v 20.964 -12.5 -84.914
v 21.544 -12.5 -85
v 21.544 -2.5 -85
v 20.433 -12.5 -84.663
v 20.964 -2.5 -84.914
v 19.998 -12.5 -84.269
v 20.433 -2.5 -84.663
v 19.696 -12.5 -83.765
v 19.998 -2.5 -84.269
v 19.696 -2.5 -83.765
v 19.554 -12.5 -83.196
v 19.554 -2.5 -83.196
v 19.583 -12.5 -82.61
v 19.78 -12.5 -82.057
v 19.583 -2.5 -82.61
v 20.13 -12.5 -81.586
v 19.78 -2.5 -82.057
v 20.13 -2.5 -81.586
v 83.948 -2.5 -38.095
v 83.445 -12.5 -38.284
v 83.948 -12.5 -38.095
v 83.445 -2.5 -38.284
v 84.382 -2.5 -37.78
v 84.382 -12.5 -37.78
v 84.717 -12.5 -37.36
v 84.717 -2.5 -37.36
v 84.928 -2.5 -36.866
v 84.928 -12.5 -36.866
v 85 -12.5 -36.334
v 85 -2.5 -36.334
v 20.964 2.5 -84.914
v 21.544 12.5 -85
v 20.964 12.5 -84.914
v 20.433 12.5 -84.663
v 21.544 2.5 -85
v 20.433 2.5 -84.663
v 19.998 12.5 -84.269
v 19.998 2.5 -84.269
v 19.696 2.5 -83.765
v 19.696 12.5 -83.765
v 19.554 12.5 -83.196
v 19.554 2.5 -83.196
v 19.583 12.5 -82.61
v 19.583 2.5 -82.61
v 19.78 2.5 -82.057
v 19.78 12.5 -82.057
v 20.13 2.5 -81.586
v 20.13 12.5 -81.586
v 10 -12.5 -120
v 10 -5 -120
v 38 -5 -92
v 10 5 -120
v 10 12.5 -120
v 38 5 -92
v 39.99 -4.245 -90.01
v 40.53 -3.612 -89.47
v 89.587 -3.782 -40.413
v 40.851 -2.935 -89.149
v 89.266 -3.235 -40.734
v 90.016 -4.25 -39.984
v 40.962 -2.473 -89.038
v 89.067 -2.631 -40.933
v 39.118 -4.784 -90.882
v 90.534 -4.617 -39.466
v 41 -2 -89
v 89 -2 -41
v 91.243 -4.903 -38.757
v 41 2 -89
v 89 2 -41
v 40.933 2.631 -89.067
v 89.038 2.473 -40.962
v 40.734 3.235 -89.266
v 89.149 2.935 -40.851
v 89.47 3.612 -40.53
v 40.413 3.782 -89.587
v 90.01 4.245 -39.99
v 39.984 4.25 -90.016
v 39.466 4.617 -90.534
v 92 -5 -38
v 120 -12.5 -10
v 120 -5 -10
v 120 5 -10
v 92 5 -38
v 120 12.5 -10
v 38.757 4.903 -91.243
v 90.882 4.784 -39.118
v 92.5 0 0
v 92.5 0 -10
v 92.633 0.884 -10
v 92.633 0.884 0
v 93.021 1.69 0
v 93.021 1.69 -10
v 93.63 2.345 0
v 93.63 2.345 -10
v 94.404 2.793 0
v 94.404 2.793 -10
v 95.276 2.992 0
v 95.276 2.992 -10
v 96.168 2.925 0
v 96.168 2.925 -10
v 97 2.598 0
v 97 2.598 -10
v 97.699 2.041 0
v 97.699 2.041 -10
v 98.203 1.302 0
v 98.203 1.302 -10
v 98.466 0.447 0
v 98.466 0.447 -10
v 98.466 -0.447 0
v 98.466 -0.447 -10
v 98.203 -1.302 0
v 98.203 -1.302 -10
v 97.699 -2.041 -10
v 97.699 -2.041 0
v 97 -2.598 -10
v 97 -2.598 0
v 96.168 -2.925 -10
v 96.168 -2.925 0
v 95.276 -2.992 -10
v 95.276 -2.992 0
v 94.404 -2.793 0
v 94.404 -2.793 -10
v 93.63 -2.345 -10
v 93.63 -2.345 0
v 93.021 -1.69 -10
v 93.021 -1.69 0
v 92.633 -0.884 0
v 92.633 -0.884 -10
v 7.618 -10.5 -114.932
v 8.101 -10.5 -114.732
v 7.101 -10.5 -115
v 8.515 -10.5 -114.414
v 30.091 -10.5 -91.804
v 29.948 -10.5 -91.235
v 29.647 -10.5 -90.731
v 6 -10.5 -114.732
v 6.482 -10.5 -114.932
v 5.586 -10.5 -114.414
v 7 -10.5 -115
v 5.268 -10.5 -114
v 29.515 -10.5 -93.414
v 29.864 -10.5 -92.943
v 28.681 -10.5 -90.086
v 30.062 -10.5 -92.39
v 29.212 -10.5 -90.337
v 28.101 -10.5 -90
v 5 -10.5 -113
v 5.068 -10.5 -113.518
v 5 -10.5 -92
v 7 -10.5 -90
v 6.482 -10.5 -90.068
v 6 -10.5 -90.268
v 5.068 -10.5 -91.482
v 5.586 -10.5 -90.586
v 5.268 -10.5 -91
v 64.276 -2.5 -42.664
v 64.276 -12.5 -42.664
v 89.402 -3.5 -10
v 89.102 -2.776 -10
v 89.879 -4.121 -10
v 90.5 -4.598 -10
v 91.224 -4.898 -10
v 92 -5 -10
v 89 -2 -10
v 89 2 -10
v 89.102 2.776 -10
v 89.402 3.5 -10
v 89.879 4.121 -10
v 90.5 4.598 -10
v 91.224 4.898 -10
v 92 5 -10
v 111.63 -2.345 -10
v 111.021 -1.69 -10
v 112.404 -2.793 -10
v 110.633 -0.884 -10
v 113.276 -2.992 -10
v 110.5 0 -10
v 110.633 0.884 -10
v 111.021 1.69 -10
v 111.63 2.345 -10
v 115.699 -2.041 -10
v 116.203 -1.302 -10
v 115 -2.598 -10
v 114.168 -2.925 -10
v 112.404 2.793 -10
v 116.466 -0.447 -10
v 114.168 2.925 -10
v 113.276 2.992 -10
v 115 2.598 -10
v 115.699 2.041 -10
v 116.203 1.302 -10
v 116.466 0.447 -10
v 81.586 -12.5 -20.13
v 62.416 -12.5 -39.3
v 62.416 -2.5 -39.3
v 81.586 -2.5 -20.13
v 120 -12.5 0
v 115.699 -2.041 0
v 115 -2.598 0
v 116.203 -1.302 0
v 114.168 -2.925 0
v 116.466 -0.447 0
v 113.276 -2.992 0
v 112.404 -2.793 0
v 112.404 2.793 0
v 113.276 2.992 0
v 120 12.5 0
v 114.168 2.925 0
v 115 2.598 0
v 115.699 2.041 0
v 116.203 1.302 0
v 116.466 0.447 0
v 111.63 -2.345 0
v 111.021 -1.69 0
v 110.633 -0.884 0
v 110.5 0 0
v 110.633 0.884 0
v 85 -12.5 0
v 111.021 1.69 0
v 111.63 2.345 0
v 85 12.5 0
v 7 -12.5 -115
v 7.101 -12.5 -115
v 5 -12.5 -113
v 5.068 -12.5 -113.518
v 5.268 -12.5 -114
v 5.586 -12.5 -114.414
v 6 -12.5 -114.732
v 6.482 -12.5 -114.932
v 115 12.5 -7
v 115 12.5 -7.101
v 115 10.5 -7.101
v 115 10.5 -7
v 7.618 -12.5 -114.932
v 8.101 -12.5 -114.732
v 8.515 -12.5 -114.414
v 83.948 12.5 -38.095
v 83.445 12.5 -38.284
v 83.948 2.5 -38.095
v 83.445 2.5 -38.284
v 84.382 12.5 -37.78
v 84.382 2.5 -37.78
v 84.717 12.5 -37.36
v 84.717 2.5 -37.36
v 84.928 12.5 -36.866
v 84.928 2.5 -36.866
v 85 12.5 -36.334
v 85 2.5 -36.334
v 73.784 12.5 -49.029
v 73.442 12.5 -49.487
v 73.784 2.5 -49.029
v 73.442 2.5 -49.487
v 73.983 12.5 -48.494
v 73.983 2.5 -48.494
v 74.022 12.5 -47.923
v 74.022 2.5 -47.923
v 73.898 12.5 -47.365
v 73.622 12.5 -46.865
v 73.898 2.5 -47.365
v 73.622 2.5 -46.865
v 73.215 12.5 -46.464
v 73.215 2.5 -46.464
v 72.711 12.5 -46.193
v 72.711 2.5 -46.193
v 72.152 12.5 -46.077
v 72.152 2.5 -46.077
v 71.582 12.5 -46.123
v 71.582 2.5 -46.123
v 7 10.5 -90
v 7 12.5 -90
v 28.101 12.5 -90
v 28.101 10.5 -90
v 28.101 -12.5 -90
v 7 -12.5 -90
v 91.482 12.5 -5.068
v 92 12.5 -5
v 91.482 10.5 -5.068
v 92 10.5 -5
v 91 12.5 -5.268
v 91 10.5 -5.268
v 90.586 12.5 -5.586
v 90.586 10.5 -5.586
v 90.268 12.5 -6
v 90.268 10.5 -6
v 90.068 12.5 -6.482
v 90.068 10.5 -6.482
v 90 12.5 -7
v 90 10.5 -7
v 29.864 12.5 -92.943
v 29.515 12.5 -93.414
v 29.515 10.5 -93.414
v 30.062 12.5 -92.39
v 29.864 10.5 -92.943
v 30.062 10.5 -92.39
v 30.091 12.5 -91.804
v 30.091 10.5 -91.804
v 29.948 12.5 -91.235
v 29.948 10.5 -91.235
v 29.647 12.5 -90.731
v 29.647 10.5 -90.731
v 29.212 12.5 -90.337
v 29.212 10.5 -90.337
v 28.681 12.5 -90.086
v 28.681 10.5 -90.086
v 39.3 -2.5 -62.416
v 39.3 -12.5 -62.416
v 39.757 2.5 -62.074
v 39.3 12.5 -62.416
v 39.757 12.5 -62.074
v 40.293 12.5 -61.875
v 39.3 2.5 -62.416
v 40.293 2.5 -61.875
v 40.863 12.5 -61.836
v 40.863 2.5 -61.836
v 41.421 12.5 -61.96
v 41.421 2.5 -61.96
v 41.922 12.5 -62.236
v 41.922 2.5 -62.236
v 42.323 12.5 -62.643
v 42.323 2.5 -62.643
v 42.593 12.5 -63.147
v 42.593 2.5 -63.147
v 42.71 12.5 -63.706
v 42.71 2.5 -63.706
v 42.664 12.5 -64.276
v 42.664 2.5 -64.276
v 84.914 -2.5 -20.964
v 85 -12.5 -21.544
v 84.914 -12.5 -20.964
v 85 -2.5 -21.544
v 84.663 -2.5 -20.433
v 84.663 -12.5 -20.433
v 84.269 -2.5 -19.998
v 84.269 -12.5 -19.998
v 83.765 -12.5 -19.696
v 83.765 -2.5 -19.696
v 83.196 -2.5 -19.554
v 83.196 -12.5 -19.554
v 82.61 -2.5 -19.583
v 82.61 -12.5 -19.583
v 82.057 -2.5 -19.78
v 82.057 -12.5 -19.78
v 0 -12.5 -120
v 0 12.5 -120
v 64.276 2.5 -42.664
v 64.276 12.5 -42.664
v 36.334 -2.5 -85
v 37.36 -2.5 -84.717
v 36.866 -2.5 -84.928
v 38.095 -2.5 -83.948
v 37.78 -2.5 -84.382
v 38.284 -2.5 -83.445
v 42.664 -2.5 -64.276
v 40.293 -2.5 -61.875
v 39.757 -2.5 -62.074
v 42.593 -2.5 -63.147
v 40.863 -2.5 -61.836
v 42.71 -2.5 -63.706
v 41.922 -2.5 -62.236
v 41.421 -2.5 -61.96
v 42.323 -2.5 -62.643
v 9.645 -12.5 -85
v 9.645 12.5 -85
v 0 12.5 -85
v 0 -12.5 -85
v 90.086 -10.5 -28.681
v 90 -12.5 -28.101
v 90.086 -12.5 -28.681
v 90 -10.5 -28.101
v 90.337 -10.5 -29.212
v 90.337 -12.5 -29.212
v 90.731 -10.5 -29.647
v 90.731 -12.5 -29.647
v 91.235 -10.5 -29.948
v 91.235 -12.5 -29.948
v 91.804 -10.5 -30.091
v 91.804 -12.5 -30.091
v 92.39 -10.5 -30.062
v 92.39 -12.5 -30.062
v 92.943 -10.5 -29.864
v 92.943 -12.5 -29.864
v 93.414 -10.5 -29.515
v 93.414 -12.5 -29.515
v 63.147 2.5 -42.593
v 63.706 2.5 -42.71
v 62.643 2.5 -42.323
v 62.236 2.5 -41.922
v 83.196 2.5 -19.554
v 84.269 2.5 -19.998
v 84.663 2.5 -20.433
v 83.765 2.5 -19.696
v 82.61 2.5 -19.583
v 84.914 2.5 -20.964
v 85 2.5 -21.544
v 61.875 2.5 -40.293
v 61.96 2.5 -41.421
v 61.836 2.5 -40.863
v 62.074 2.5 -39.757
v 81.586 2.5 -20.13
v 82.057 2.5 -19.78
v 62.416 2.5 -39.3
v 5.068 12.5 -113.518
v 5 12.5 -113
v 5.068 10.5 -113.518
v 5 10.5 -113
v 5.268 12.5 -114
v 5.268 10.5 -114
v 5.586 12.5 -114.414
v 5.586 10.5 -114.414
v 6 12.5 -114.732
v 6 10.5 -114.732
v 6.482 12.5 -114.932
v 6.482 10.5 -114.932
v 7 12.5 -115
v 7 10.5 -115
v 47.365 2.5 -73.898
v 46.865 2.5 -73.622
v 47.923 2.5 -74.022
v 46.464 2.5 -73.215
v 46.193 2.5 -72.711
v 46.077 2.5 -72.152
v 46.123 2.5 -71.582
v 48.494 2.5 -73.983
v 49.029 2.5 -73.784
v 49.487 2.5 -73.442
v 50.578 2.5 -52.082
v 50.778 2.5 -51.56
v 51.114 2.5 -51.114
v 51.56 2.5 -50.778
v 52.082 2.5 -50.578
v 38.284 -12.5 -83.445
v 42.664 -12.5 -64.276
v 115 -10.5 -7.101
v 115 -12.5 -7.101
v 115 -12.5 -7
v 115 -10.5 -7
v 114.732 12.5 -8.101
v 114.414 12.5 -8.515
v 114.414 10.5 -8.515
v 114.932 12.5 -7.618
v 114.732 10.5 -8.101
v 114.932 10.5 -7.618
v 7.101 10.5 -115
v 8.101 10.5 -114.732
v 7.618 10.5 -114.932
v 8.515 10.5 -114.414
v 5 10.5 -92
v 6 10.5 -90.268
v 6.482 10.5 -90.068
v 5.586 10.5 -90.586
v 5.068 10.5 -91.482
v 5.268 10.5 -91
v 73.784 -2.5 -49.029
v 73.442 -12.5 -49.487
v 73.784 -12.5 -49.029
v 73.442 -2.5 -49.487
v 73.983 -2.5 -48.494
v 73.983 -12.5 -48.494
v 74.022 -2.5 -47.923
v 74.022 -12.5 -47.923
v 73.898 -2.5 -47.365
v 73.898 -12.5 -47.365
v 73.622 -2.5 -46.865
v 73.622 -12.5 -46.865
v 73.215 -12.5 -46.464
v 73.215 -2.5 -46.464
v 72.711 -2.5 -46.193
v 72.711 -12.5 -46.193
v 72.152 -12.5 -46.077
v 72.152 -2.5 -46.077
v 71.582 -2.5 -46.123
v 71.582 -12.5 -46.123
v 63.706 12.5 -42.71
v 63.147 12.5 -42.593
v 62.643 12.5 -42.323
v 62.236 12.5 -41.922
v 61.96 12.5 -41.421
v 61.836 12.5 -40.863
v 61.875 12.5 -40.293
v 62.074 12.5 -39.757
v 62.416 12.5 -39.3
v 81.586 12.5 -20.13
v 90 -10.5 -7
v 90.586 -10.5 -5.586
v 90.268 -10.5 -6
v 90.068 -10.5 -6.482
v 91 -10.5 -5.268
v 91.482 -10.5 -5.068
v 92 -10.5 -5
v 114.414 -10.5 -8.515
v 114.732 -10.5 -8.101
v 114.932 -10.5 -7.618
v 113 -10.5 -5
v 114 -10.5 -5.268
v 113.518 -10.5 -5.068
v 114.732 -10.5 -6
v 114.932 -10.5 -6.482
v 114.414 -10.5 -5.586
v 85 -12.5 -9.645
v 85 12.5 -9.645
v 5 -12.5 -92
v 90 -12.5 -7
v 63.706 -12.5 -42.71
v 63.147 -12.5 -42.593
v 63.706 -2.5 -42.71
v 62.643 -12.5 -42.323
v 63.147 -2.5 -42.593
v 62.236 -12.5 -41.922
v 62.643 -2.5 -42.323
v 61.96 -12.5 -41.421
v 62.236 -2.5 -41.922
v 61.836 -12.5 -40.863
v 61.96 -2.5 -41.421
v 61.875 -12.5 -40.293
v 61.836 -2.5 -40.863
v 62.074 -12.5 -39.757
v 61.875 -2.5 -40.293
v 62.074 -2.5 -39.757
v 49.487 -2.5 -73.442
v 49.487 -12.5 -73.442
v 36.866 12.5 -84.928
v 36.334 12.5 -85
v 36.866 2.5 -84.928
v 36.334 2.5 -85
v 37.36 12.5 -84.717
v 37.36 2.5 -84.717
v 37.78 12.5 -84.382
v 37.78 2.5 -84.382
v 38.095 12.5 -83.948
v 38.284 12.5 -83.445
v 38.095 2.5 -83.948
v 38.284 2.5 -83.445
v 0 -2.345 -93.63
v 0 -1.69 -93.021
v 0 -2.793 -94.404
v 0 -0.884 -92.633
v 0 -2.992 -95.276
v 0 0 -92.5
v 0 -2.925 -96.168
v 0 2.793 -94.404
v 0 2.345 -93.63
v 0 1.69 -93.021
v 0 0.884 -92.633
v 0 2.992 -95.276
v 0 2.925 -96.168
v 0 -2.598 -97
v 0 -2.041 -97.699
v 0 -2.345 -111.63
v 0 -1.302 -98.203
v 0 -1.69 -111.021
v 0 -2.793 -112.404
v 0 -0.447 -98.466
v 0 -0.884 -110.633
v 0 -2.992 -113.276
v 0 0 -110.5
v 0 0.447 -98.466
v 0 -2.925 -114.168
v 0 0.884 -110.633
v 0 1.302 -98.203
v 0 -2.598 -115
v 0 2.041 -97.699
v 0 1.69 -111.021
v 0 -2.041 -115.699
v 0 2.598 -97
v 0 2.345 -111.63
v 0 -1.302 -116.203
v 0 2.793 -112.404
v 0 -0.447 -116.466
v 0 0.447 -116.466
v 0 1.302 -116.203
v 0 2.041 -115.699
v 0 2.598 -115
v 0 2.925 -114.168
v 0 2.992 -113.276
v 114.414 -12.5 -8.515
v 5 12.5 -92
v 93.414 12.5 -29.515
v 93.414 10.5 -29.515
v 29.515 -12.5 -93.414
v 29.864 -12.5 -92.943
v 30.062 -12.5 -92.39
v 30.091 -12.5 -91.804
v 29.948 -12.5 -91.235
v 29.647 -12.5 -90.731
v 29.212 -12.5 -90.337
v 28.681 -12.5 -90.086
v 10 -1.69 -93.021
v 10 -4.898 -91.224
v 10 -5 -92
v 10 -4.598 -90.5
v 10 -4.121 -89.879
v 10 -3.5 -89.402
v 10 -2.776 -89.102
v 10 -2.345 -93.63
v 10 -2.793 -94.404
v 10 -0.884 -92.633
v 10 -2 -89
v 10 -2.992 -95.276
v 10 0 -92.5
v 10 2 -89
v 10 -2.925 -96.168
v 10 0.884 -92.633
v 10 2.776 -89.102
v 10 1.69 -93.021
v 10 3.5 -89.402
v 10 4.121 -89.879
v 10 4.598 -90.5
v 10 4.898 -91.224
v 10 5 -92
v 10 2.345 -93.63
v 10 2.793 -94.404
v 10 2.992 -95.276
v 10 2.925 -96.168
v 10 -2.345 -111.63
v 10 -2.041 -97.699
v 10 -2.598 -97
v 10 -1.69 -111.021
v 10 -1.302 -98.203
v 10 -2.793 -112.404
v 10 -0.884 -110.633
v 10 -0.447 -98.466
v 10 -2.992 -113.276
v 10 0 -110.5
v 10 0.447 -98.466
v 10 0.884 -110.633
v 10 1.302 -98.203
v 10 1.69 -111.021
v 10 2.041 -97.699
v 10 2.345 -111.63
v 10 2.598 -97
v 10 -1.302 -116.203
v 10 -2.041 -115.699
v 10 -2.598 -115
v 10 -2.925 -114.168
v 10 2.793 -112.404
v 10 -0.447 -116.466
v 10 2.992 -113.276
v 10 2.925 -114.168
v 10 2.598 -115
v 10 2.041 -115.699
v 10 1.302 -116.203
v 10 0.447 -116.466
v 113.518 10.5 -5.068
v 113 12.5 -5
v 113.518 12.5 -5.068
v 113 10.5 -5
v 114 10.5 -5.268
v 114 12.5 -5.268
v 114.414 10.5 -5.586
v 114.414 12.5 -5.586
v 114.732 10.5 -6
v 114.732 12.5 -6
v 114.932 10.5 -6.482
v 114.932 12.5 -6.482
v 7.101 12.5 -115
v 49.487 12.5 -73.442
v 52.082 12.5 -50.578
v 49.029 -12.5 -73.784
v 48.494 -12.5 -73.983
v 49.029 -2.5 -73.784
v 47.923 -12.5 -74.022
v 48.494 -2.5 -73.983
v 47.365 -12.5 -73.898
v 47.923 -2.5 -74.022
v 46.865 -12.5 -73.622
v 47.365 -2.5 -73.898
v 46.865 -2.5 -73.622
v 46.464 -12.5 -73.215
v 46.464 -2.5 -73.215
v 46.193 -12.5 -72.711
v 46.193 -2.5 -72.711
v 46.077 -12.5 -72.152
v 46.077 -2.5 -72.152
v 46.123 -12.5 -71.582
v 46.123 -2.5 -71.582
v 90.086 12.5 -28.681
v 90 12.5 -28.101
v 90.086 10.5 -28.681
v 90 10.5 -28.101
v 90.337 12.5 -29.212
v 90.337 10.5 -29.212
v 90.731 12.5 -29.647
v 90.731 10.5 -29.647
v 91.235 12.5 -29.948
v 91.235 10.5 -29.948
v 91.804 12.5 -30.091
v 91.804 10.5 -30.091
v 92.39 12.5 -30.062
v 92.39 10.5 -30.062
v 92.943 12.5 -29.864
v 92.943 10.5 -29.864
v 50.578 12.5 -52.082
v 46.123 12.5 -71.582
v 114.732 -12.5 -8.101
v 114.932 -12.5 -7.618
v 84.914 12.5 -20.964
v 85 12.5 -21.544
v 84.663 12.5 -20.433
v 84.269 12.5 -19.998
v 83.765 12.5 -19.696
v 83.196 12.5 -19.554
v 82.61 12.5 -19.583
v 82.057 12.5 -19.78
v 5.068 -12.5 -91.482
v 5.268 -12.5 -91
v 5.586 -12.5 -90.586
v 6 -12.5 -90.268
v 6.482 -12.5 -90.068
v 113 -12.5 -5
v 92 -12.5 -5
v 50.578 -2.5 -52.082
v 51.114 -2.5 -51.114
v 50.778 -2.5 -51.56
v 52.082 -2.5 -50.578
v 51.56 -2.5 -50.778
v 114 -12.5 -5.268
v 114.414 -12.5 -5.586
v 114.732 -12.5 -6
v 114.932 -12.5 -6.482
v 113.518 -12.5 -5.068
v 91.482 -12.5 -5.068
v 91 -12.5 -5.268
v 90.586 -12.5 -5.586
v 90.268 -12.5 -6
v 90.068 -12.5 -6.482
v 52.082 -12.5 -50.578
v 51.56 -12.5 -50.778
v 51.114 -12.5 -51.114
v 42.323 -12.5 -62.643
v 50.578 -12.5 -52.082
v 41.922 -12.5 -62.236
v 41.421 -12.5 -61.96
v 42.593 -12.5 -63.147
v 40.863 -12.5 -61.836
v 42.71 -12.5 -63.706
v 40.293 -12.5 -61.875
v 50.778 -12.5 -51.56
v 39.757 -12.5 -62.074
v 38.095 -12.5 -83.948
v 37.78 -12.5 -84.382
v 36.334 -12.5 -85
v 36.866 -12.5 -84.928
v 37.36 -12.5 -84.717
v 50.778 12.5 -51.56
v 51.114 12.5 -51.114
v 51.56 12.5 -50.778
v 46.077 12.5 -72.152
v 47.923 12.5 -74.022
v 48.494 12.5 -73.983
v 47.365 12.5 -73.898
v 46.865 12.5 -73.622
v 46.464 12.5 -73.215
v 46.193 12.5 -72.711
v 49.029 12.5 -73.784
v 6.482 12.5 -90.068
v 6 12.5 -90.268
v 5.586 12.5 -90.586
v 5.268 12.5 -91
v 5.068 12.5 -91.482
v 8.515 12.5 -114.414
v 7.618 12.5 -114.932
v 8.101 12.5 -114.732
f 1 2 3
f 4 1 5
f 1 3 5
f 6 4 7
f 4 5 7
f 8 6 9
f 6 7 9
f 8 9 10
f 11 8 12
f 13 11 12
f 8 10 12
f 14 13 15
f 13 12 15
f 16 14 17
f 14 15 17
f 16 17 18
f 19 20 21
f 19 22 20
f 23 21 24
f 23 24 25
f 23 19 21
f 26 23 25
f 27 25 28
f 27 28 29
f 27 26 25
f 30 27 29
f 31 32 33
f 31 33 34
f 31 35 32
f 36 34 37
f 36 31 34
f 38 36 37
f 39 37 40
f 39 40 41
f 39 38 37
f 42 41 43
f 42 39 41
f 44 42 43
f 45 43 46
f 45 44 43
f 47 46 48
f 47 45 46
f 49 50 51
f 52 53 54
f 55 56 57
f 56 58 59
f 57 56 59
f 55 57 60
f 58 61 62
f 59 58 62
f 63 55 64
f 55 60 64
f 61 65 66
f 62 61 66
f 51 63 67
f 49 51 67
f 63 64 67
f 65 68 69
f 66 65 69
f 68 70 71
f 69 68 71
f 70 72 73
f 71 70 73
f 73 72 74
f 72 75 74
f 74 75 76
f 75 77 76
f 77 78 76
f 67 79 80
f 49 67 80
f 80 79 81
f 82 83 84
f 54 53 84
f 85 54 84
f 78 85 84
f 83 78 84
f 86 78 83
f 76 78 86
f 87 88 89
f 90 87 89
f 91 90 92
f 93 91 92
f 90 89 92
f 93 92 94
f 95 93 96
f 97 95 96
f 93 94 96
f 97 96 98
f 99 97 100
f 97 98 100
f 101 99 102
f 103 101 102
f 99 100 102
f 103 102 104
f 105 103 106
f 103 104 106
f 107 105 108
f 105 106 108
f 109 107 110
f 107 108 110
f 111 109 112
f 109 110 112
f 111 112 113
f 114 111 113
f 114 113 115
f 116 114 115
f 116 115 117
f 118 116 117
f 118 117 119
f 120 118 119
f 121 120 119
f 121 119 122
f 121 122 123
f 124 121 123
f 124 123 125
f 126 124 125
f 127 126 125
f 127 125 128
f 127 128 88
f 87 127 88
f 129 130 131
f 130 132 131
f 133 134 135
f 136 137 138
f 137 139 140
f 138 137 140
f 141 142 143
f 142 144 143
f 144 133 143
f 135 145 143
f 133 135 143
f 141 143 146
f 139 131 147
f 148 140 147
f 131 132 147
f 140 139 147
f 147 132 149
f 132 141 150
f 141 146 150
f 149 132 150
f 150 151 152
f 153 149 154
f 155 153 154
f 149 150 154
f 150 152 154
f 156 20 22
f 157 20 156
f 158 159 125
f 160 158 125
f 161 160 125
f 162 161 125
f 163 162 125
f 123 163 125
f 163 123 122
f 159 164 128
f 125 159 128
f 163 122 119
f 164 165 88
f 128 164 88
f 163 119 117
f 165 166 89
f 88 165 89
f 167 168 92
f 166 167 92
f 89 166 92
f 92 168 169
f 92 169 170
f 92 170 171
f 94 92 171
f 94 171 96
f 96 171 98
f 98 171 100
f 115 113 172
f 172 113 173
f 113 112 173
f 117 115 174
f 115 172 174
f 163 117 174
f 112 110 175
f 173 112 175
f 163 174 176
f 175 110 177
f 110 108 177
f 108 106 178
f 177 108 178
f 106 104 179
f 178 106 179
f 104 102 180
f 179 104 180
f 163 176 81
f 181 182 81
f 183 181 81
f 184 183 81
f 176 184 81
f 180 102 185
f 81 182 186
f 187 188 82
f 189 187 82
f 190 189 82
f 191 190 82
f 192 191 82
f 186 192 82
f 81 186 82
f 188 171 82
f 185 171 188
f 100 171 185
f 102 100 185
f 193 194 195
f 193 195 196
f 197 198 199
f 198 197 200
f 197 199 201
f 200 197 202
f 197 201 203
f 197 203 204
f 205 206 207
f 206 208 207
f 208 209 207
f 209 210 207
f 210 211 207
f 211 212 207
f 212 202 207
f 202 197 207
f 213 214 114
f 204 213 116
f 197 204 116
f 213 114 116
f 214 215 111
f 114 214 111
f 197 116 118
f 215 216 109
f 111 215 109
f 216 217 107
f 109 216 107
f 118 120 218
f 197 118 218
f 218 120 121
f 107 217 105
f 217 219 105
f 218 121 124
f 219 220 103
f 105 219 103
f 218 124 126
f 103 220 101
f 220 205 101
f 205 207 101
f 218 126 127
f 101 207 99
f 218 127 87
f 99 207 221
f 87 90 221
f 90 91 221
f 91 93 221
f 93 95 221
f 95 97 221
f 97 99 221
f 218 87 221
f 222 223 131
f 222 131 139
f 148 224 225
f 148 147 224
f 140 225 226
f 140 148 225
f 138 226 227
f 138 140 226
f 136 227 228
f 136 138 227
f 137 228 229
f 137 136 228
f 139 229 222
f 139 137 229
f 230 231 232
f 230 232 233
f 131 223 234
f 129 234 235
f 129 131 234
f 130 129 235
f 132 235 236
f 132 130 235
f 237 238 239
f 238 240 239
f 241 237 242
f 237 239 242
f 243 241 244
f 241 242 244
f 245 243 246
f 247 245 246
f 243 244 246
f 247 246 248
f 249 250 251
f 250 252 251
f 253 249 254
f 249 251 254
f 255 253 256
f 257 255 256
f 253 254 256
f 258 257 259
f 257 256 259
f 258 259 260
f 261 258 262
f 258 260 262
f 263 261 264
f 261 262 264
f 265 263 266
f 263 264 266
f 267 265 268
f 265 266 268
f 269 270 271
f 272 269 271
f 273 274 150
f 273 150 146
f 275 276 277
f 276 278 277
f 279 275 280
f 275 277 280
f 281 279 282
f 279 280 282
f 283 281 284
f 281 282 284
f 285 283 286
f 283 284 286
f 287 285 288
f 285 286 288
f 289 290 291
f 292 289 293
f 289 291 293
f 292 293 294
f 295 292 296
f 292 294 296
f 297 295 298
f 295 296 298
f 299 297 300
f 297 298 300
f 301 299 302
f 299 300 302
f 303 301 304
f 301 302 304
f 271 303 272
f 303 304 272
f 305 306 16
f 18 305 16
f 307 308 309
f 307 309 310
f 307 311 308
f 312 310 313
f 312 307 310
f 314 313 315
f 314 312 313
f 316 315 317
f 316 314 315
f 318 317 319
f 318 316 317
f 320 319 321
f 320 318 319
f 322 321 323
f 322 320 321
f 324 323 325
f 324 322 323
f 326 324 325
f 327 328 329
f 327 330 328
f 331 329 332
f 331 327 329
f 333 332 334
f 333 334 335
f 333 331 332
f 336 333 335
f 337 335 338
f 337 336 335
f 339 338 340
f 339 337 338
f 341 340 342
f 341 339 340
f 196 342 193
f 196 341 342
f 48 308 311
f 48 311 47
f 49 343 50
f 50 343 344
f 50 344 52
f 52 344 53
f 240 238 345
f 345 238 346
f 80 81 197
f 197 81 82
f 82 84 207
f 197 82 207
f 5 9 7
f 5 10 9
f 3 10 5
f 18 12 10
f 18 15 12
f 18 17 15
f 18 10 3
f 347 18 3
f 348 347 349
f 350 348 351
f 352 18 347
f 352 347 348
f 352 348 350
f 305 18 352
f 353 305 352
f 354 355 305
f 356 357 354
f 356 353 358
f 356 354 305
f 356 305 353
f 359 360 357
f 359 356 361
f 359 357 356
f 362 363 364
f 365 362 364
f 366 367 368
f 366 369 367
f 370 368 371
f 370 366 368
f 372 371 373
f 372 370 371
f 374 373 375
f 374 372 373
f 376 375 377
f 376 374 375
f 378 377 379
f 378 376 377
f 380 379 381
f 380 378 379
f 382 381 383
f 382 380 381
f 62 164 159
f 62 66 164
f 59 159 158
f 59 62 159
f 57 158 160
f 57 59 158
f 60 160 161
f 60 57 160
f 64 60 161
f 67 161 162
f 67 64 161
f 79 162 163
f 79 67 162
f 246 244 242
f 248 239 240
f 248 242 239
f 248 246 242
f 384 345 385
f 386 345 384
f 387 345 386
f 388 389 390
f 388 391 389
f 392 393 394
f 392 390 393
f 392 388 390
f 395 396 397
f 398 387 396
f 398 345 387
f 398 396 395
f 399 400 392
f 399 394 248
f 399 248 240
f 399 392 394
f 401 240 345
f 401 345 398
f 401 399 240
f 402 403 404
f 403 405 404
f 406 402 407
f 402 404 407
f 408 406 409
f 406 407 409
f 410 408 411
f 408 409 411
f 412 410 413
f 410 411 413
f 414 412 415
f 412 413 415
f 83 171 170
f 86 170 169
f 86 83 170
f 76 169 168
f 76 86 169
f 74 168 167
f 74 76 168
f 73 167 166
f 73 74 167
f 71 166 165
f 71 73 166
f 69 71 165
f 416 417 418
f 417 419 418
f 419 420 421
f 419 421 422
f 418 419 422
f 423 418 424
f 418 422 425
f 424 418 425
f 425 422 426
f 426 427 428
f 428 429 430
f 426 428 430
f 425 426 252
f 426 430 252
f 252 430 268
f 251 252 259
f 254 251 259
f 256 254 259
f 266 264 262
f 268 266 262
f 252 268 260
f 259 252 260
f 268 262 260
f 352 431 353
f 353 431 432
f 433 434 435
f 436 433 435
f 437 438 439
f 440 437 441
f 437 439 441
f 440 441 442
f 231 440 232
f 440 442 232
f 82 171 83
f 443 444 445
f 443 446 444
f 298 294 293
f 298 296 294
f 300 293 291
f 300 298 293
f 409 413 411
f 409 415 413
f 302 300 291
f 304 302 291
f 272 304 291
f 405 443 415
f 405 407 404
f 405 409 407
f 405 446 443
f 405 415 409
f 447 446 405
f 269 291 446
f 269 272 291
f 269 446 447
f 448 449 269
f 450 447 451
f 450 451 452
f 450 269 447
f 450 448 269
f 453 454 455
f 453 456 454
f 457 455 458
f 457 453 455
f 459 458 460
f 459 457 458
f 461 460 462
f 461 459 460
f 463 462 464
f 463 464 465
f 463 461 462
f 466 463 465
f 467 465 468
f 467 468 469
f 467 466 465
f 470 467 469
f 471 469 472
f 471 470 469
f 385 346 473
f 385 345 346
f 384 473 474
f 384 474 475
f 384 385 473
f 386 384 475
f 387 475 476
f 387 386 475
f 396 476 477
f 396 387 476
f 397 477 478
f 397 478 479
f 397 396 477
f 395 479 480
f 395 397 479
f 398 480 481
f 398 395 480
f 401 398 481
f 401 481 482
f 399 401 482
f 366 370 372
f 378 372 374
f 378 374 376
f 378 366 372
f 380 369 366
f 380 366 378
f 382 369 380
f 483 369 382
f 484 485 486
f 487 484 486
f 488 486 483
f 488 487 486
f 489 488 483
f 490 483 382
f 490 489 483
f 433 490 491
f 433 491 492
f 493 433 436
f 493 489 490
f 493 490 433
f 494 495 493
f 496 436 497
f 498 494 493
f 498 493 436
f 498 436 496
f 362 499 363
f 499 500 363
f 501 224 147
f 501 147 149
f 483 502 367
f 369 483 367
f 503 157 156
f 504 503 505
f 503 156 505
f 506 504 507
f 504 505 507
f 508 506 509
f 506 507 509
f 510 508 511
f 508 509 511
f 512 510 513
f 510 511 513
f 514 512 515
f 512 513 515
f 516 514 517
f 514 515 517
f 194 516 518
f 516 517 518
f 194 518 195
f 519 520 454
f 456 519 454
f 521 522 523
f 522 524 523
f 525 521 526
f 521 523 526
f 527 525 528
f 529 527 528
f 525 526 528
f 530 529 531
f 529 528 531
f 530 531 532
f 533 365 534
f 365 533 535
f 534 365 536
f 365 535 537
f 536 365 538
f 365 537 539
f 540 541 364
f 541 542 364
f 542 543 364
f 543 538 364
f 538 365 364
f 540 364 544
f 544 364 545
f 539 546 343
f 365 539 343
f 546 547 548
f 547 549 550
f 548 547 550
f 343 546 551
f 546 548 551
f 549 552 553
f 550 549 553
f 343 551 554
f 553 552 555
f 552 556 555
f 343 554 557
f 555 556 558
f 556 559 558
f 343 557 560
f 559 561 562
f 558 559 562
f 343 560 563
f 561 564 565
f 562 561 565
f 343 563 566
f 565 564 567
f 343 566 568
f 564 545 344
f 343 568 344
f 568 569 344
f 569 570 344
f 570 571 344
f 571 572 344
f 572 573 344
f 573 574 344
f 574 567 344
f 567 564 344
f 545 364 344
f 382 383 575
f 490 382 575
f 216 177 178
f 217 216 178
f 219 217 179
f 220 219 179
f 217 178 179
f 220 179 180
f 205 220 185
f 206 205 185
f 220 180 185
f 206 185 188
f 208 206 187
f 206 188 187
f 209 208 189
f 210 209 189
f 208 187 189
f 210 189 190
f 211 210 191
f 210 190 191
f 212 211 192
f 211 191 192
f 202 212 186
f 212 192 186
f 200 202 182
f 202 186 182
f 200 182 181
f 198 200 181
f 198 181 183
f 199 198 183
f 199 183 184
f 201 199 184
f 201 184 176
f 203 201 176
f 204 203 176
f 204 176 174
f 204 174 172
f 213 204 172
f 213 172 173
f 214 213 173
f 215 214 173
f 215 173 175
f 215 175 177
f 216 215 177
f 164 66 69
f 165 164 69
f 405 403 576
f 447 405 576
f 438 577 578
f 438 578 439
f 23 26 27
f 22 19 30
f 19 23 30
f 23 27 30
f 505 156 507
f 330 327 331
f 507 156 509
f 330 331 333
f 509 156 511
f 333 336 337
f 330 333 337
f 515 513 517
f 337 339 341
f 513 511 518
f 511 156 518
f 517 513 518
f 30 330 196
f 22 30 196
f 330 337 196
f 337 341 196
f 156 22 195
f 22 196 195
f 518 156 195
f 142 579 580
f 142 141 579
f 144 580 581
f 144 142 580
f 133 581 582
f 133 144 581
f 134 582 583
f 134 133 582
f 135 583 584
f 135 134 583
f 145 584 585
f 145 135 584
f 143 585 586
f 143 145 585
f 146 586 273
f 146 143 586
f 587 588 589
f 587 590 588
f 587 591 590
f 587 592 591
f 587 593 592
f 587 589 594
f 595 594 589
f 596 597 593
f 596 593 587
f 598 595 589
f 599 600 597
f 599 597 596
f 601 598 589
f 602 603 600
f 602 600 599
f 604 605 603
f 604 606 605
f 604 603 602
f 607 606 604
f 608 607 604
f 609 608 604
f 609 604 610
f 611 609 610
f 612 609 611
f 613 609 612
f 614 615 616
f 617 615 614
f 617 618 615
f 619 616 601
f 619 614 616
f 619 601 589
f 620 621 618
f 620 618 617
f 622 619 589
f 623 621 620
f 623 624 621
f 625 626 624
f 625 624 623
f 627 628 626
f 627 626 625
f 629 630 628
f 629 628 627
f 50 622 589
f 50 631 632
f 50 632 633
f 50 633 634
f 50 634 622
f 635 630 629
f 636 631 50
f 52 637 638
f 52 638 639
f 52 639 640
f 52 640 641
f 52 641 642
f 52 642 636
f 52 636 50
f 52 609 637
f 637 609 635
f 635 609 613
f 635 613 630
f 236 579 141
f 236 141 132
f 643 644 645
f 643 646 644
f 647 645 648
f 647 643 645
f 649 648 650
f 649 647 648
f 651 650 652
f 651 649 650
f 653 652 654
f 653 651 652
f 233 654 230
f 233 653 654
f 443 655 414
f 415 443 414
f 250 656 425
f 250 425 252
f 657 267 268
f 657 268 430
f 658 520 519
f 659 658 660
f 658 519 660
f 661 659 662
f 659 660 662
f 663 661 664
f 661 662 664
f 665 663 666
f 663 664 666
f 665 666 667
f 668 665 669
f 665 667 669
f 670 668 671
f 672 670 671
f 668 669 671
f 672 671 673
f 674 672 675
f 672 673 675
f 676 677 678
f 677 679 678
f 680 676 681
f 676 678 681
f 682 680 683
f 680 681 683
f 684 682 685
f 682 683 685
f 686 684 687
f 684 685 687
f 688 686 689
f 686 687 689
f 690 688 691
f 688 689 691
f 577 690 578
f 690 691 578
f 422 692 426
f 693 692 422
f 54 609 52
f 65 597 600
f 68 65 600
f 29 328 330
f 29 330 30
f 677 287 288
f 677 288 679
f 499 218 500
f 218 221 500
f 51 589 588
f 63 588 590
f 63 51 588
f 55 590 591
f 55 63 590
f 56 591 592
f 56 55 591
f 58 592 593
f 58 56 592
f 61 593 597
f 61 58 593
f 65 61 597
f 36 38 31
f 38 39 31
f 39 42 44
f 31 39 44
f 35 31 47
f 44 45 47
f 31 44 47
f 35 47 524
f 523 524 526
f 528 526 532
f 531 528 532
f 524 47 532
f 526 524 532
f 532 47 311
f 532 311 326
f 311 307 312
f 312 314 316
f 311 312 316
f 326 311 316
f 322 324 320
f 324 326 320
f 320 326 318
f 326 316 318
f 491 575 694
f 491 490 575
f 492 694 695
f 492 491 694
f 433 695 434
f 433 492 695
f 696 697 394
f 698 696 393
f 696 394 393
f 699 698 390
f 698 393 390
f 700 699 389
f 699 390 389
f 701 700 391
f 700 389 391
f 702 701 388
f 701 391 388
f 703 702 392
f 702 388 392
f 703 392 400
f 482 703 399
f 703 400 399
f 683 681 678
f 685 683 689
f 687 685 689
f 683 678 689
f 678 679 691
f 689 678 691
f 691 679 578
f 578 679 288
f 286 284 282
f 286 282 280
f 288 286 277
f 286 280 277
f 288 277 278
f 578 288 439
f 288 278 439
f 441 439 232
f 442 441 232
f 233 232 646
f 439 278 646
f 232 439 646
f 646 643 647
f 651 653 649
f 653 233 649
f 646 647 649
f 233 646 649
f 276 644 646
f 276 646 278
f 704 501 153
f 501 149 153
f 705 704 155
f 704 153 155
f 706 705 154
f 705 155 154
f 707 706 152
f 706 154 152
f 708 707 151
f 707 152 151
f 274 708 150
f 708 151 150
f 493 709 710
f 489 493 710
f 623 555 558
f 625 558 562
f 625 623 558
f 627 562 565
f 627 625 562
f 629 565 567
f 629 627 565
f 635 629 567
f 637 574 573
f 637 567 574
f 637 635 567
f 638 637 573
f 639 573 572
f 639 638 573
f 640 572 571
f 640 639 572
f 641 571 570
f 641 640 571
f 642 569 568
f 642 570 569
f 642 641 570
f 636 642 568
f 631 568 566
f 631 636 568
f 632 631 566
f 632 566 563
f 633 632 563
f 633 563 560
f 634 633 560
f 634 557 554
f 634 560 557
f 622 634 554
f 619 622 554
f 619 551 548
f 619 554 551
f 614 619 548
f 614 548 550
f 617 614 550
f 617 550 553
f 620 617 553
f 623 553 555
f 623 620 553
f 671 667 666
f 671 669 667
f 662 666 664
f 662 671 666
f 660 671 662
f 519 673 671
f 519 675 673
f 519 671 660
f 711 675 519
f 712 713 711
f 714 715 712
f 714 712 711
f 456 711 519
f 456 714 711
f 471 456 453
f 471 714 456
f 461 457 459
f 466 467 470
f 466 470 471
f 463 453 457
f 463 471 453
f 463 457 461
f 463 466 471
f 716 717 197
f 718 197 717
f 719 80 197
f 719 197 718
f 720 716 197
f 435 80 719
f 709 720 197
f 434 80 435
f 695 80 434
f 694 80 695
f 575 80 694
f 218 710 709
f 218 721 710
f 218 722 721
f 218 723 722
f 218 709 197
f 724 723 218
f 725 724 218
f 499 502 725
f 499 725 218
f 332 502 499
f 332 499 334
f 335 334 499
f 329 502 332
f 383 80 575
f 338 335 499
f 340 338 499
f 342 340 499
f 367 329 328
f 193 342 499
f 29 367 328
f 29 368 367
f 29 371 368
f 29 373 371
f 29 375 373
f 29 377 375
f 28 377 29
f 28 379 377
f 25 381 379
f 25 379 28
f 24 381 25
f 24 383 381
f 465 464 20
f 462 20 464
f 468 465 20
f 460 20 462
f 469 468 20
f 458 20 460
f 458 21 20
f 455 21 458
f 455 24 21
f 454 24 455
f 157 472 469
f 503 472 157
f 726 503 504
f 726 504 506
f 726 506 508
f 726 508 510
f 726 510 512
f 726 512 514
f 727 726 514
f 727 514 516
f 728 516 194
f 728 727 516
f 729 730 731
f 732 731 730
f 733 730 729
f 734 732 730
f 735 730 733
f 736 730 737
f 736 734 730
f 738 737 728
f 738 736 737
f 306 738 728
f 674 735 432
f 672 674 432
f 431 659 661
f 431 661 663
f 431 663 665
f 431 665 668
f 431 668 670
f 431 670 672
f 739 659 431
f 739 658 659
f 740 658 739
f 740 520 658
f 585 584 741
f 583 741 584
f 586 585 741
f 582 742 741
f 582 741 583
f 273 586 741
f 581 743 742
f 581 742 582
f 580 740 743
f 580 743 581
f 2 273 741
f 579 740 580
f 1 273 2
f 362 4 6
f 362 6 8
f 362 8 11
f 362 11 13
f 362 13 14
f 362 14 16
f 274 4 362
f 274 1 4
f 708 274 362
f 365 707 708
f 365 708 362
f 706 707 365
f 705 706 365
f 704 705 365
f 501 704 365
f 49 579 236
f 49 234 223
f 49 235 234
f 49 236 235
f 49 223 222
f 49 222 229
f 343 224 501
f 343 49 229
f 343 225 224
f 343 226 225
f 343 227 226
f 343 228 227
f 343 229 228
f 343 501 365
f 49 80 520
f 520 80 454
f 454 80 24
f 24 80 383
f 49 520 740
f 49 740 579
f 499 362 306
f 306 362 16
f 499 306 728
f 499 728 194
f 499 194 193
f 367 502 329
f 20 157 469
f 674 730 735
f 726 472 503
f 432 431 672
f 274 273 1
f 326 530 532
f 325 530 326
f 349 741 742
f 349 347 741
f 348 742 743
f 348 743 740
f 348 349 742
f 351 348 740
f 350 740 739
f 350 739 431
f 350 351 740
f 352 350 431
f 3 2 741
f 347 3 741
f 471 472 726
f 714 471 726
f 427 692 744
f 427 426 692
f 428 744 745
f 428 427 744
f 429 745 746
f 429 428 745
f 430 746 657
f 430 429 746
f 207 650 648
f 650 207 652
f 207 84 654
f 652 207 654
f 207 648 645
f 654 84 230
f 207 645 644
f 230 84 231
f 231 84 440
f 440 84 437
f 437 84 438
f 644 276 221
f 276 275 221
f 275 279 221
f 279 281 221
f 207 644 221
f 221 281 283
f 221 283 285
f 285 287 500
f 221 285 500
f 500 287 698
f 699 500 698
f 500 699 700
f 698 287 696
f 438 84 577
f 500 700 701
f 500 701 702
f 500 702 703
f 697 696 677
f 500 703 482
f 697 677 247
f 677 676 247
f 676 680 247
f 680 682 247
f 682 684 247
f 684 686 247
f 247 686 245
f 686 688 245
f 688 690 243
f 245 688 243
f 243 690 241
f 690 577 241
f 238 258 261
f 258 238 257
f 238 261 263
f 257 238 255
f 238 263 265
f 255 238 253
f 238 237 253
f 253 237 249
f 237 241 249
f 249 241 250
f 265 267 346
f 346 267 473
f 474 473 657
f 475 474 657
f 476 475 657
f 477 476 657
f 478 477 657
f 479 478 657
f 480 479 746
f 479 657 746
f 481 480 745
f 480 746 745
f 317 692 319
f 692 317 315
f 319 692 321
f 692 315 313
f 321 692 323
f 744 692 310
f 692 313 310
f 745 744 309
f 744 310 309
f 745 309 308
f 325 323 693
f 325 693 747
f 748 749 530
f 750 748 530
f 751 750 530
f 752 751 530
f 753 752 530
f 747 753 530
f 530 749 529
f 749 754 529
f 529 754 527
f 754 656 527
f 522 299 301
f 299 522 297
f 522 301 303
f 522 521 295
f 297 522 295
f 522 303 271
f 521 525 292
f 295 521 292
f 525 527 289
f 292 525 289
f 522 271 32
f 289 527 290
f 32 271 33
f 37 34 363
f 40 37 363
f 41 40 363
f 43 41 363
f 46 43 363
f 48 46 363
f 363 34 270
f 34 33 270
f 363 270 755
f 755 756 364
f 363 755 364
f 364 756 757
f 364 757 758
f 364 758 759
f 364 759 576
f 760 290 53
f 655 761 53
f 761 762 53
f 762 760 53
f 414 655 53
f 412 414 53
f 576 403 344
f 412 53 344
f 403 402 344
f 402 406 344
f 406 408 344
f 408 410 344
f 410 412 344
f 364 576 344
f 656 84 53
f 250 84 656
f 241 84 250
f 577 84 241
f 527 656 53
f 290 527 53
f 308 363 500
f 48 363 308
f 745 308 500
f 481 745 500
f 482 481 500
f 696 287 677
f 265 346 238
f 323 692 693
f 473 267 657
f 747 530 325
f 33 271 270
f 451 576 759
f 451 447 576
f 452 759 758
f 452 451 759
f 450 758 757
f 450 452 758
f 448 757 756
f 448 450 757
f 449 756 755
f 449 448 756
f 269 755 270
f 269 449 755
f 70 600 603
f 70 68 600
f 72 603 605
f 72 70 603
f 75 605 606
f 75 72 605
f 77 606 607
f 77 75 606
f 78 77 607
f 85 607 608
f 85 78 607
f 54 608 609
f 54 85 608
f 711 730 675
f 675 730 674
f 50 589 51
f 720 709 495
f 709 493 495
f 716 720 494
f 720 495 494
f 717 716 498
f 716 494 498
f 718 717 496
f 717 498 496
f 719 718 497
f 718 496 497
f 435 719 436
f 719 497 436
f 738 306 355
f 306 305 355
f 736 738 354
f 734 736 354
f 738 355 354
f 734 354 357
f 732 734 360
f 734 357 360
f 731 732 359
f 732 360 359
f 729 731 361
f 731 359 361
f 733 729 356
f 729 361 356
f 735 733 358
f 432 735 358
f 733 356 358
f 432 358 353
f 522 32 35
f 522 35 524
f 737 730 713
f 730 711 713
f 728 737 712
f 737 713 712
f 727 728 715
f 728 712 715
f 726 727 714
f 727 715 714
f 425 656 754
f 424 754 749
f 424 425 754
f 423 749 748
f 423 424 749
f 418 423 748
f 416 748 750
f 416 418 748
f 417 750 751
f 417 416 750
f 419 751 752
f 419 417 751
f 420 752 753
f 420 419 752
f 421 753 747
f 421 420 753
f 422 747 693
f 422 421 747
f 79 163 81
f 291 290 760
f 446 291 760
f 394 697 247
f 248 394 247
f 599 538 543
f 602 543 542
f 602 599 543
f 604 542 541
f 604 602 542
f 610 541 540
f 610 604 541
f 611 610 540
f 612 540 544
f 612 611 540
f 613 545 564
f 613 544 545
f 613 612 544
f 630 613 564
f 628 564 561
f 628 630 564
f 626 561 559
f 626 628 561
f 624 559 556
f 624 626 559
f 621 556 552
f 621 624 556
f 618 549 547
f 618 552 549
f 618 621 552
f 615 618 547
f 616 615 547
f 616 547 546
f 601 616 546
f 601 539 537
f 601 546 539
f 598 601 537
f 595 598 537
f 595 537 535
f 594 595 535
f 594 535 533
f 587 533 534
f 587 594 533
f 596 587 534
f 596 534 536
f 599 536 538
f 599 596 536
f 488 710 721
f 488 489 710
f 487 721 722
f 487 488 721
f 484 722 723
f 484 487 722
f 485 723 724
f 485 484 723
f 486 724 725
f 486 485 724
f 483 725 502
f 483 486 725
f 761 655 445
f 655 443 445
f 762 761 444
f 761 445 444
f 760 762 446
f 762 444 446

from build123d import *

# Parameters (mm, degrees)
BOSS_EXTRUDE1_DEPTH  = 12.5
CUT_EXTRUDE1_START   = -10
SKETCH2_W            = 31
SKETCH2_H            = 10
CUT_EXTRUDE1_DEPTH   = 161.165360752
CUT_EXTRUDE2_DEPTH   = 10
CUT_EXTRUDE3_DEPTH   = 2
FILLET3_R            = 2
FILLET3_OF_MIRROR2_R = 2
SKETCH6_R            = 3
CUT_EXTRUDE5_DEPTH   = 164.267418673
FILLET4_R            = 3
FILLET4_OF_MIRROR3_R = 3


with BuildPart() as part:
    # Sketch1 → Boss-Extrude1 (new, symmetric)
    with BuildSketch(Plane(origin=(0, 0, 0), x_dir=(1, 0, 0), z_dir=(0, 1, 0))):
        Polygon((0, 120), (10, 120), (120, 10), (120, 0), (85, 0), (85, 9.644660941), (9.644660941, 85), (0, 85), align=None)
    extrude(amount=BOSS_EXTRUDE1_DEPTH, both=True)

    # Sketch2 → Cut-Extrude1 (cut, through all)
    with BuildSketch(Plane.XY.offset(CUT_EXTRUDE1_START)):
        with Locations((104.5, 0)):
            Rectangle(SKETCH2_W, SKETCH2_H)
    cut_extrude1 = extrude(amount=-CUT_EXTRUDE1_DEPTH, mode=Mode.SUBTRACT)

    # Sketch3 → Cut-Extrude2 (cut)
    with BuildSketch(Plane.XZ.offset(12.5)):
        Polygon((57.505379907, -44.210348845), (85, -16.715728753), (85, -37.928932188), align=None)
        Polygon((16.715728753, -85), (37.928932188, -85), (44.210348845, -57.505379907), align=None)
        Polygon((44.576447719, -78.352484469), (78.352484469, -44.576447719), (50.857864376, -50.857864376), align=None)
    cut_extrude2 = extrude(amount=-CUT_EXTRUDE2_DEPTH, mode=Mode.SUBTRACT)

    # Sketch4 → Cut-Extrude3 (cut)
    with BuildSketch(Plane.XZ.offset(12.5)):
        Polygon((5, -90), (32.928932188, -90), (7.928932188, -115), (5, -115), align=None)
        Polygon((115, -5), (90, -5), (90, -32.928932188), (115, -7.928932188), align=None)
    cut_extrude3 = extrude(amount=-CUT_EXTRUDE3_DEPTH, mode=Mode.SUBTRACT)

    # Fillet3
    fillet3_edges = [part.edges().sort_by_distance(p)[0] for p in [
        (16.715728753, -7.5, -85),
        (44.210348845, -7.5, -57.505379907),
        (37.928932188, -7.5, -85),
        (50.857864376, -7.5, -50.857864376),
        (78.352484469, -7.5, -44.576447719),
        (44.576447719, -7.5, -78.352484469),
        (85, -7.5, -37.928932188),
        (57.505379907, -7.5, -44.210348845),
        (85, -7.5, -16.715728753),
        (5, -11.5, -115),
        (5, -11.5, -90),
        (32.928932188, -11.5, -90),
        (7.928932188, -11.5, -115),
        (90, -11.5, -32.928932188),
        (90, -11.5, -5),
        (115, -11.5, -5),
        (115, -11.5, -7.928932188),
    ]]
    fillet(fillet3_edges, radius=FILLET3_R)

    # Mirror2: Cut-Extrude2, Cut-Extrude3 across plane
    add(cut_extrude2.mirror(Plane.ZX), mode=Mode.SUBTRACT)
    add(cut_extrude3.mirror(Plane.ZX), mode=Mode.SUBTRACT)

    # Fillet3 of Mirror2
    fillet3_of_mirror2_edges = [part.edges().sort_by_distance(p)[0] for p in [
        (16.715728753, 7.5, -85),
        (44.210348845, 7.5, -57.505379907),
        (37.928932188, 7.5, -85),
        (50.857864376, 7.5, -50.857864376),
        (78.352484469, 7.5, -44.576447719),
        (44.576447719, 7.5, -78.352484469),
        (85, 7.5, -37.928932188),
        (57.505379907, 7.5, -44.210348845),
        (85, 7.5, -16.715728753),
        (5, 11.5, -115),
        (5, 11.5, -90),
        (32.928932188, 11.5, -90),
        (7.928932188, 11.5, -115),
        (90, 11.5, -32.928932188),
        (90, 11.5, -5),
        (115, 11.5, -5),
        (115, 11.5, -7.928932188),
    ]]
    fillet(fillet3_of_mirror2_edges, radius=FILLET3_OF_MIRROR2_R)

    # Sketch6 → Cut-Extrude5 (cut, through all)
    with BuildSketch(Plane(origin=(0, 0, -10), x_dir=(-1, 0, 0), z_dir=(0, 0, -1))):
        with Locations((-113.5, 0)):
            Circle(SKETCH6_R)
        with Locations((-95.5, 0)):
            Circle(SKETCH6_R)
    cut_extrude5 = extrude(amount=-CUT_EXTRUDE5_DEPTH, mode=Mode.SUBTRACT)

    # Fillet4
    fillet4_edges = [part.edges().sort_by_distance(p)[0] for p in [
        (89, -5, -25.5),
        (89, 5, -25.5),
    ]]
    fillet(fillet4_edges, radius=FILLET4_R)

    # Mirror3: Cut-Extrude1, Cut-Extrude5 across plane
    add(cut_extrude1.mirror(Plane(origin=(0, 0, 0), x_dir=(-0.7071067811865475, 0, 0.7071067811865477), z_dir=(0.7071067811865476, 0, 0.7071067811865475))), mode=Mode.SUBTRACT)
    add(cut_extrude5.mirror(Plane(origin=(0, 0, 0), x_dir=(-0.7071067811865475, 0, 0.7071067811865477), z_dir=(0.7071067811865476, 0, 0.7071067811865475))), mode=Mode.SUBTRACT)

    # Fillet4 of Mirror3
    fillet4_of_mirror3_edges = [part.edges().sort_by_distance(p)[0] for p in [
        (25.5, -5, -89),
        (25.5, 5, -89),
    ]]
    fillet(fillet4_of_mirror3_edges, radius=FILLET4_OF_MIRROR3_R)


solid = part.part
